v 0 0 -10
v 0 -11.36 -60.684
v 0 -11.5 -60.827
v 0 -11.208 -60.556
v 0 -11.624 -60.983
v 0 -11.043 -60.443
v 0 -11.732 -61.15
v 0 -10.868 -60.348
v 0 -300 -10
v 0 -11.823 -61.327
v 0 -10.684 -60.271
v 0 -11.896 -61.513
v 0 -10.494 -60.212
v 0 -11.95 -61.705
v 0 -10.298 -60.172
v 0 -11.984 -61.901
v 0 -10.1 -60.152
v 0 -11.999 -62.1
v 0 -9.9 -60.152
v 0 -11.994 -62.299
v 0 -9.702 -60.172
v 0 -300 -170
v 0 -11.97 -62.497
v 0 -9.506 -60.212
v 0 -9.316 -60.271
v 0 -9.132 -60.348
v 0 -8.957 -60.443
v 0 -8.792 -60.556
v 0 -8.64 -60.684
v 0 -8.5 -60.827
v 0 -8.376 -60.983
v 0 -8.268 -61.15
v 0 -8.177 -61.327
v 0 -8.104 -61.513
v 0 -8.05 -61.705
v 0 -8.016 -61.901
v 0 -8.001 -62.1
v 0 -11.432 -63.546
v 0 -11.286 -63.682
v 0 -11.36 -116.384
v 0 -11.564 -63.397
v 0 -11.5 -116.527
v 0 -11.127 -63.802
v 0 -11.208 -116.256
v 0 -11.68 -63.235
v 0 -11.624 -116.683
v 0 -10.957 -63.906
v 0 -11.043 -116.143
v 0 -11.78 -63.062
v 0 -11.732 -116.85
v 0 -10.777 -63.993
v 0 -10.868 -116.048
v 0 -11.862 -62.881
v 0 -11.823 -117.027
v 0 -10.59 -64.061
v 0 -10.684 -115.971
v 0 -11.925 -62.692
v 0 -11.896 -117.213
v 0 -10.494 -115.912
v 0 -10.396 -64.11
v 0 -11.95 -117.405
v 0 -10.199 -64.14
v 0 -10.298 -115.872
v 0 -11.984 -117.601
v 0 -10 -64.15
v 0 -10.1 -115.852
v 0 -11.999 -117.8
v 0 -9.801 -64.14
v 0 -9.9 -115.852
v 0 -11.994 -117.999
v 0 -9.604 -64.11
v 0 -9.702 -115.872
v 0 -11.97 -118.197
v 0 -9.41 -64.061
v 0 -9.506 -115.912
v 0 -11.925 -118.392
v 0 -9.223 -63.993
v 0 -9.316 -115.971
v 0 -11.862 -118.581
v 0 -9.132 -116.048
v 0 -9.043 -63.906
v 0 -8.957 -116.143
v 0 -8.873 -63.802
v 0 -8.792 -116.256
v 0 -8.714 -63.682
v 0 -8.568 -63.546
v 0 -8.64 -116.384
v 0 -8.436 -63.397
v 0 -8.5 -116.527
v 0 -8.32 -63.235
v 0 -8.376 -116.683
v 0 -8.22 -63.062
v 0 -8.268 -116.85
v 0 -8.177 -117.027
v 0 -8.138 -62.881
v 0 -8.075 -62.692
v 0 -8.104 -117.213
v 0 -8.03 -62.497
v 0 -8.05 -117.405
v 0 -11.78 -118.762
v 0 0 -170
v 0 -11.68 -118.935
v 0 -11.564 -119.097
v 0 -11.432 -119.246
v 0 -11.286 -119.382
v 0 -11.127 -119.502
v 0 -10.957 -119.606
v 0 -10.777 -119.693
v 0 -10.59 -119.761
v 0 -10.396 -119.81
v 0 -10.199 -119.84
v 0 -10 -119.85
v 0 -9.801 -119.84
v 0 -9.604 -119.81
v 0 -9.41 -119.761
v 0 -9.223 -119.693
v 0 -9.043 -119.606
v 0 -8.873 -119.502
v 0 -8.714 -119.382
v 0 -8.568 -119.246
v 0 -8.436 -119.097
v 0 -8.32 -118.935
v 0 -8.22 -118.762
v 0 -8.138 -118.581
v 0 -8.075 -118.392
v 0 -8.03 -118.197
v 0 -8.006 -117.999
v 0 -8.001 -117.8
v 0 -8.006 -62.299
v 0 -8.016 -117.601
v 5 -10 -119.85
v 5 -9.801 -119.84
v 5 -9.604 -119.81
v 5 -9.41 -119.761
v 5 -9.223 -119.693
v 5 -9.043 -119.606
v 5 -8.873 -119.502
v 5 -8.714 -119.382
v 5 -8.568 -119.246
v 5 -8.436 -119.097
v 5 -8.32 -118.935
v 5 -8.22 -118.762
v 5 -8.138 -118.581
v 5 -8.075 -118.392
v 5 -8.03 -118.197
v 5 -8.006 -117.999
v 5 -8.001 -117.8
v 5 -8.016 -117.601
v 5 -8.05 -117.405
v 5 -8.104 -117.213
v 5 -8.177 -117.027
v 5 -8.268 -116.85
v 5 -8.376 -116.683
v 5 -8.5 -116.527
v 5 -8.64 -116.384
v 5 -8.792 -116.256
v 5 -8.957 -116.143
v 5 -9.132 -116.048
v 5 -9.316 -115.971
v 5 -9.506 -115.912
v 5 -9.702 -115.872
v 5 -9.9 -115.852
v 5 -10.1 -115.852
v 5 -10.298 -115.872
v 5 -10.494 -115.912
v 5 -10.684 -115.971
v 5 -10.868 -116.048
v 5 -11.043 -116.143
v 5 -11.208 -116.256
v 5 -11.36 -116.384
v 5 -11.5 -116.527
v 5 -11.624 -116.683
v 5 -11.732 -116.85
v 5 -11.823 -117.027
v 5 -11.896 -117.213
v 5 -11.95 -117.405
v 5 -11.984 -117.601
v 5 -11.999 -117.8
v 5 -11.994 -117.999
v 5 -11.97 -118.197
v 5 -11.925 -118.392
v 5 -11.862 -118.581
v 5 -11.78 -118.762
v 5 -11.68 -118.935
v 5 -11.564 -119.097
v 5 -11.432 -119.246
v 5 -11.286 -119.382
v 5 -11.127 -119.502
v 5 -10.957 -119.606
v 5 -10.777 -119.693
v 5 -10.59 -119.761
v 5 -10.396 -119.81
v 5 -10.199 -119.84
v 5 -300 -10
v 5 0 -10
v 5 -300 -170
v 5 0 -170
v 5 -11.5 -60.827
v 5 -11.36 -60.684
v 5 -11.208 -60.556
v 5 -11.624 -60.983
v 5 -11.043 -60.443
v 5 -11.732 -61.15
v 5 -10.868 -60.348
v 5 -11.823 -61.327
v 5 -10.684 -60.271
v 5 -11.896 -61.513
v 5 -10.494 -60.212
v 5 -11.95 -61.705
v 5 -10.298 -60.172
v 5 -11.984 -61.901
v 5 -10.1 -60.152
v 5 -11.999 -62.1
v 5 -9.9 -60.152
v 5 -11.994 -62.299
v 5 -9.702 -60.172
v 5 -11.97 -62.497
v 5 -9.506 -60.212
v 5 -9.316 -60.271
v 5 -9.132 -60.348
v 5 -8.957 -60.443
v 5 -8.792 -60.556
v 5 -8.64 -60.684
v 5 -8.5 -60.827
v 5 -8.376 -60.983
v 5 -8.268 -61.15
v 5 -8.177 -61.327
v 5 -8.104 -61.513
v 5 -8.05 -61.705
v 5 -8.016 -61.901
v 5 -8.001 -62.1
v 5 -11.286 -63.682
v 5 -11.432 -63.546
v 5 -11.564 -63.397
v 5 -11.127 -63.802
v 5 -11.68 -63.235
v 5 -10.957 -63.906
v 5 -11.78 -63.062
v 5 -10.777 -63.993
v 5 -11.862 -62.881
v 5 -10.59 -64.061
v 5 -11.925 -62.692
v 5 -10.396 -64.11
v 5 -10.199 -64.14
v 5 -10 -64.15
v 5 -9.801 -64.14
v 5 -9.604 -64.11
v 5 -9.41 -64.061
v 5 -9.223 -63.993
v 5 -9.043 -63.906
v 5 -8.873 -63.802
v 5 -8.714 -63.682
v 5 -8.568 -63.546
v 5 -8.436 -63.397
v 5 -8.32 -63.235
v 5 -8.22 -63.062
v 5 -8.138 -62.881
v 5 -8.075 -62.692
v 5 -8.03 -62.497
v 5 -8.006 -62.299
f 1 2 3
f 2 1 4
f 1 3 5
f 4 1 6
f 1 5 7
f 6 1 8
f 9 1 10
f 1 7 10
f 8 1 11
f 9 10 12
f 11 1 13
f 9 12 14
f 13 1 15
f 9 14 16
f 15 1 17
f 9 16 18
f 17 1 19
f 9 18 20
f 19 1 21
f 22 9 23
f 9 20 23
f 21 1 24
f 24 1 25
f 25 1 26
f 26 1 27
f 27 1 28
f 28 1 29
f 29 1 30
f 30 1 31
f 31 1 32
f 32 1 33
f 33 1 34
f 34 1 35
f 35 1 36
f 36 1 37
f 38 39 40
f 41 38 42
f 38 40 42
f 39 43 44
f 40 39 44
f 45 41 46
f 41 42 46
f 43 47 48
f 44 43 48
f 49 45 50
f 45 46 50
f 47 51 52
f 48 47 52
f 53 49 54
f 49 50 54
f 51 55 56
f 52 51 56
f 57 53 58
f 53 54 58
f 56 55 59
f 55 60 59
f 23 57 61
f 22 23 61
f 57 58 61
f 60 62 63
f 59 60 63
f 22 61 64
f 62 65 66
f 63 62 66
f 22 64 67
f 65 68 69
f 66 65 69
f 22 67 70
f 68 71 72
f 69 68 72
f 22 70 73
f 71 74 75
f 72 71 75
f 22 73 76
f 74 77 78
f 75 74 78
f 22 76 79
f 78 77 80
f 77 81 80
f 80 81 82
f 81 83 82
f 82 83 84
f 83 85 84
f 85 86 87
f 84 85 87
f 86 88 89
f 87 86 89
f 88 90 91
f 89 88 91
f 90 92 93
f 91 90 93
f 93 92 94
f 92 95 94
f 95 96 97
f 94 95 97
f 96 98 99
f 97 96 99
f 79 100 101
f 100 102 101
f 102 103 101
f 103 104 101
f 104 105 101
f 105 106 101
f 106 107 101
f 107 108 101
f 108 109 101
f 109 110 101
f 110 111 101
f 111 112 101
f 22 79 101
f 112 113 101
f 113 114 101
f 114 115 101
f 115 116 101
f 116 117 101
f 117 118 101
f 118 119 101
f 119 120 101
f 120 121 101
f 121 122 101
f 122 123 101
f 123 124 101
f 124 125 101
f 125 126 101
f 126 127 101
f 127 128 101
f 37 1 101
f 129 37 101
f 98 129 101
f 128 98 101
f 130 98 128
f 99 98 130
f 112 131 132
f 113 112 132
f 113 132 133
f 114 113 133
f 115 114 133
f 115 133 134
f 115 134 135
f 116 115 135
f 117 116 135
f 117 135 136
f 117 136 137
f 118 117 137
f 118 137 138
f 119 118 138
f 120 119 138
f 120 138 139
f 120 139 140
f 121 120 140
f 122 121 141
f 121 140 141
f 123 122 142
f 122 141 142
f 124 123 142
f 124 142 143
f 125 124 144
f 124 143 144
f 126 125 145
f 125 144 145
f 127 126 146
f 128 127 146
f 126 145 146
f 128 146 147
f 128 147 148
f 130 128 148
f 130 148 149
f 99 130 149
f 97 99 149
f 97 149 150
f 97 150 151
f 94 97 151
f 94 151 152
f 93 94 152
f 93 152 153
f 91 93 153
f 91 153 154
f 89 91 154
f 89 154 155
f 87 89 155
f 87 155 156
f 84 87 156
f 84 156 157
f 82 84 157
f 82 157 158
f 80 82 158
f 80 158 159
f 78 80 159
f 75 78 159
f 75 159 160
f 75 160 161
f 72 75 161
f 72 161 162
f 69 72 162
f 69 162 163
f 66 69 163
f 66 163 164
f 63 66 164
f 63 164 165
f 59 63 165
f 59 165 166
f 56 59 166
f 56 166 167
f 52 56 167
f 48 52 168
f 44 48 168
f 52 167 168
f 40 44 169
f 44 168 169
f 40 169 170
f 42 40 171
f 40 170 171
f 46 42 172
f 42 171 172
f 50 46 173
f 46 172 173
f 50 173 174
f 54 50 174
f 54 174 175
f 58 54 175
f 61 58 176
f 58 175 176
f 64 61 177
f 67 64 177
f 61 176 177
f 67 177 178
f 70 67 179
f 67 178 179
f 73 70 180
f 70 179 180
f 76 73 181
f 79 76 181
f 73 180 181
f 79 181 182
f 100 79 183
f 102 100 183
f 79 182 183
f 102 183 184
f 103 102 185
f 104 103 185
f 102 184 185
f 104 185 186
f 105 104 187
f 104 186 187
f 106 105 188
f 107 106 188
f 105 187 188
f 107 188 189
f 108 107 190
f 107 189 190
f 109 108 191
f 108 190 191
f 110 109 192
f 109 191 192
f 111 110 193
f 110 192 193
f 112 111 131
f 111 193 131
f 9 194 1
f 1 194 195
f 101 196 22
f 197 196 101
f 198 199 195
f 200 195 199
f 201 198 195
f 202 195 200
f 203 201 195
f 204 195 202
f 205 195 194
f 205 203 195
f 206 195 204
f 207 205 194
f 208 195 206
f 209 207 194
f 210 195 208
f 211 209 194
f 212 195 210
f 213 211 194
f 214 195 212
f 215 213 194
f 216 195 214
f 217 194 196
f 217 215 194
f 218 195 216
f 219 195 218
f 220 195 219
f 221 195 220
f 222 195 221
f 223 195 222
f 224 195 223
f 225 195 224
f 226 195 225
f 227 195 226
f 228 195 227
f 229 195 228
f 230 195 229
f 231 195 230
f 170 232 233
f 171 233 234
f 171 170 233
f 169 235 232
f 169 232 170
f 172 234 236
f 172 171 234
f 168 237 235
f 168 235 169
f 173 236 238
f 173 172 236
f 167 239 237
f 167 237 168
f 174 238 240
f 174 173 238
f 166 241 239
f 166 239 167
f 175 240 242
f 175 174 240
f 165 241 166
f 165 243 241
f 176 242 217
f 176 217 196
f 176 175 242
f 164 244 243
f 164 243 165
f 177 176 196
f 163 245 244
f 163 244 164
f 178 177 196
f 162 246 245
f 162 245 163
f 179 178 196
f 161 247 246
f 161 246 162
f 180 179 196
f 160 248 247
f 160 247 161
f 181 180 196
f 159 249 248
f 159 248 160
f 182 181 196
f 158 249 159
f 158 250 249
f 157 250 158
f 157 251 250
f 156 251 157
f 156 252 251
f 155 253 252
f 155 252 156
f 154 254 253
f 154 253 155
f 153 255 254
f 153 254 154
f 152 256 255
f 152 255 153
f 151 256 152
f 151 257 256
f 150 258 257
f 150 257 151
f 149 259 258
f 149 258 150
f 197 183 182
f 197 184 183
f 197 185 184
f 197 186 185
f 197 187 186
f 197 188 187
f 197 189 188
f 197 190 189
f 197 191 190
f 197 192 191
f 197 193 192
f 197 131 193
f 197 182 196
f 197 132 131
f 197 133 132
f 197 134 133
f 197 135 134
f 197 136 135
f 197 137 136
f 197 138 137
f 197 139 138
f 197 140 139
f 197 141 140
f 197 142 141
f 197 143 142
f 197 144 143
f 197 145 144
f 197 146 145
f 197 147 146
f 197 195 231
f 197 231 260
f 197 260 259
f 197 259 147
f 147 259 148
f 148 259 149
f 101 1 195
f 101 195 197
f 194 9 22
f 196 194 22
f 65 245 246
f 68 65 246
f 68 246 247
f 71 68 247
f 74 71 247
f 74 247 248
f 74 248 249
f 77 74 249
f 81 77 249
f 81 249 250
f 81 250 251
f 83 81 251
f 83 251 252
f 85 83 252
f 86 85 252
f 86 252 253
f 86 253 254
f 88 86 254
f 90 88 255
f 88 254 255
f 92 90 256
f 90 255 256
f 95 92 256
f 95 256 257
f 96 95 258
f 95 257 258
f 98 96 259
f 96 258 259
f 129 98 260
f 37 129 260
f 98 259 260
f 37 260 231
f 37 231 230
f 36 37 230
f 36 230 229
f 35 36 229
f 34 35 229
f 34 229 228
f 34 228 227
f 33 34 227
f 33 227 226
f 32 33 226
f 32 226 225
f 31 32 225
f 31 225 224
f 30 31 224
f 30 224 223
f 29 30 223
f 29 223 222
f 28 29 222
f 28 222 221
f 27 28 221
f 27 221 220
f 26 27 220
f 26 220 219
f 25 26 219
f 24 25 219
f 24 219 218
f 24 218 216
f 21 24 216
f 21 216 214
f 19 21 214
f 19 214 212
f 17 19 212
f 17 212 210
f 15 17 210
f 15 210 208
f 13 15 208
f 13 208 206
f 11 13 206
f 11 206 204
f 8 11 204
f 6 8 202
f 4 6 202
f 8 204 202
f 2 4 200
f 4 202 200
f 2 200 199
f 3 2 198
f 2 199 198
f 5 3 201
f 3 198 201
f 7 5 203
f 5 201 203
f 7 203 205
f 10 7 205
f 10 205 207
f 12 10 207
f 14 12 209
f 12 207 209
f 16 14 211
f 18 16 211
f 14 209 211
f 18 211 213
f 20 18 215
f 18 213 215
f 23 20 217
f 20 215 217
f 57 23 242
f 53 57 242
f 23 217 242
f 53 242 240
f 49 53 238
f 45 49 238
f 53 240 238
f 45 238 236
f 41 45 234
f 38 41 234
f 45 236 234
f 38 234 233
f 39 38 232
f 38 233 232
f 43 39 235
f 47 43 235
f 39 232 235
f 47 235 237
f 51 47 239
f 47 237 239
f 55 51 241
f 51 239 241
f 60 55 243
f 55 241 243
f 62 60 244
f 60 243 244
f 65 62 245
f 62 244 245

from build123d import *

# Parameters (mm, degrees)
SKETCH_1_W          = 180
SKETCH_1_H          = 300
EXTRUDE_1_DEPTH     = 5
CUT_EXTRUDE_1_REACH = 7
SKETCH_2_R          = 2
SKETCH_4_W          = 10
SKETCH_4_H          = 300
CUT_EXTRUDE_3_DEPTH = 10


with BuildPart() as part:
    # 草图1 → 凸台-拉伸1 (new body)
    with BuildSketch(Plane(origin=(0, 0, 0), x_dir=(0, 0, -1), z_dir=(1, 0, 0))):
        with Locations((90, -150)):
            Rectangle(SKETCH_1_W, SKETCH_1_H)
    extrude(amount=EXTRUDE_1_DEPTH)

    # 草图2 → 切除-拉伸1 (cut, up to next)
    with BuildSketch(Plane(origin=(5, 0, 0), x_dir=(0, 0, -1), z_dir=(1, 0, 0)), mode=Mode.PRIVATE) as cut_extrude_1_sk1:
        with Locations((62.15, -10)):
            Circle(SKETCH_2_R)
    cut_extrude_1_tool1 = extrude(cut_extrude_1_sk1.sketch, amount=-CUT_EXTRUDE_1_REACH, mode=Mode.PRIVATE) & part.part
    add(cut_extrude_1_tool1.solids().sort_by_distance((5, -10, -62.15))[0], mode=Mode.SUBTRACT)
    # 草图2 → 切除-拉伸1 (cut, up to next)
    with BuildSketch(Plane(origin=(5, 0, 0), x_dir=(0, 0, -1), z_dir=(1, 0, 0)), mode=Mode.PRIVATE) as cut_extrude_1_sk2:
        with Locations((117.85, -10)):
            Circle(SKETCH_2_R)
    cut_extrude_1_tool2 = extrude(cut_extrude_1_sk2.sketch, amount=-CUT_EXTRUDE_1_REACH, mode=Mode.PRIVATE) & part.part
    add(cut_extrude_1_tool2.solids().sort_by_distance((5, -10, -117.85))[0], mode=Mode.SUBTRACT)

    # 草图4 → 切除-拉伸3 (cut)
    with BuildSketch(Plane(origin=(5, 0, 0), x_dir=(0, 0, -1), z_dir=(1, 0, 0))):
        with Locations((5, -150)):
            Rectangle(SKETCH_4_W, SKETCH_4_H)
        with Locations((175, -150)):
            Rectangle(SKETCH_4_W, SKETCH_4_H)
    extrude(amount=-CUT_EXTRUDE_3_DEPTH, mode=Mode.SUBTRACT)


solid = part.part
